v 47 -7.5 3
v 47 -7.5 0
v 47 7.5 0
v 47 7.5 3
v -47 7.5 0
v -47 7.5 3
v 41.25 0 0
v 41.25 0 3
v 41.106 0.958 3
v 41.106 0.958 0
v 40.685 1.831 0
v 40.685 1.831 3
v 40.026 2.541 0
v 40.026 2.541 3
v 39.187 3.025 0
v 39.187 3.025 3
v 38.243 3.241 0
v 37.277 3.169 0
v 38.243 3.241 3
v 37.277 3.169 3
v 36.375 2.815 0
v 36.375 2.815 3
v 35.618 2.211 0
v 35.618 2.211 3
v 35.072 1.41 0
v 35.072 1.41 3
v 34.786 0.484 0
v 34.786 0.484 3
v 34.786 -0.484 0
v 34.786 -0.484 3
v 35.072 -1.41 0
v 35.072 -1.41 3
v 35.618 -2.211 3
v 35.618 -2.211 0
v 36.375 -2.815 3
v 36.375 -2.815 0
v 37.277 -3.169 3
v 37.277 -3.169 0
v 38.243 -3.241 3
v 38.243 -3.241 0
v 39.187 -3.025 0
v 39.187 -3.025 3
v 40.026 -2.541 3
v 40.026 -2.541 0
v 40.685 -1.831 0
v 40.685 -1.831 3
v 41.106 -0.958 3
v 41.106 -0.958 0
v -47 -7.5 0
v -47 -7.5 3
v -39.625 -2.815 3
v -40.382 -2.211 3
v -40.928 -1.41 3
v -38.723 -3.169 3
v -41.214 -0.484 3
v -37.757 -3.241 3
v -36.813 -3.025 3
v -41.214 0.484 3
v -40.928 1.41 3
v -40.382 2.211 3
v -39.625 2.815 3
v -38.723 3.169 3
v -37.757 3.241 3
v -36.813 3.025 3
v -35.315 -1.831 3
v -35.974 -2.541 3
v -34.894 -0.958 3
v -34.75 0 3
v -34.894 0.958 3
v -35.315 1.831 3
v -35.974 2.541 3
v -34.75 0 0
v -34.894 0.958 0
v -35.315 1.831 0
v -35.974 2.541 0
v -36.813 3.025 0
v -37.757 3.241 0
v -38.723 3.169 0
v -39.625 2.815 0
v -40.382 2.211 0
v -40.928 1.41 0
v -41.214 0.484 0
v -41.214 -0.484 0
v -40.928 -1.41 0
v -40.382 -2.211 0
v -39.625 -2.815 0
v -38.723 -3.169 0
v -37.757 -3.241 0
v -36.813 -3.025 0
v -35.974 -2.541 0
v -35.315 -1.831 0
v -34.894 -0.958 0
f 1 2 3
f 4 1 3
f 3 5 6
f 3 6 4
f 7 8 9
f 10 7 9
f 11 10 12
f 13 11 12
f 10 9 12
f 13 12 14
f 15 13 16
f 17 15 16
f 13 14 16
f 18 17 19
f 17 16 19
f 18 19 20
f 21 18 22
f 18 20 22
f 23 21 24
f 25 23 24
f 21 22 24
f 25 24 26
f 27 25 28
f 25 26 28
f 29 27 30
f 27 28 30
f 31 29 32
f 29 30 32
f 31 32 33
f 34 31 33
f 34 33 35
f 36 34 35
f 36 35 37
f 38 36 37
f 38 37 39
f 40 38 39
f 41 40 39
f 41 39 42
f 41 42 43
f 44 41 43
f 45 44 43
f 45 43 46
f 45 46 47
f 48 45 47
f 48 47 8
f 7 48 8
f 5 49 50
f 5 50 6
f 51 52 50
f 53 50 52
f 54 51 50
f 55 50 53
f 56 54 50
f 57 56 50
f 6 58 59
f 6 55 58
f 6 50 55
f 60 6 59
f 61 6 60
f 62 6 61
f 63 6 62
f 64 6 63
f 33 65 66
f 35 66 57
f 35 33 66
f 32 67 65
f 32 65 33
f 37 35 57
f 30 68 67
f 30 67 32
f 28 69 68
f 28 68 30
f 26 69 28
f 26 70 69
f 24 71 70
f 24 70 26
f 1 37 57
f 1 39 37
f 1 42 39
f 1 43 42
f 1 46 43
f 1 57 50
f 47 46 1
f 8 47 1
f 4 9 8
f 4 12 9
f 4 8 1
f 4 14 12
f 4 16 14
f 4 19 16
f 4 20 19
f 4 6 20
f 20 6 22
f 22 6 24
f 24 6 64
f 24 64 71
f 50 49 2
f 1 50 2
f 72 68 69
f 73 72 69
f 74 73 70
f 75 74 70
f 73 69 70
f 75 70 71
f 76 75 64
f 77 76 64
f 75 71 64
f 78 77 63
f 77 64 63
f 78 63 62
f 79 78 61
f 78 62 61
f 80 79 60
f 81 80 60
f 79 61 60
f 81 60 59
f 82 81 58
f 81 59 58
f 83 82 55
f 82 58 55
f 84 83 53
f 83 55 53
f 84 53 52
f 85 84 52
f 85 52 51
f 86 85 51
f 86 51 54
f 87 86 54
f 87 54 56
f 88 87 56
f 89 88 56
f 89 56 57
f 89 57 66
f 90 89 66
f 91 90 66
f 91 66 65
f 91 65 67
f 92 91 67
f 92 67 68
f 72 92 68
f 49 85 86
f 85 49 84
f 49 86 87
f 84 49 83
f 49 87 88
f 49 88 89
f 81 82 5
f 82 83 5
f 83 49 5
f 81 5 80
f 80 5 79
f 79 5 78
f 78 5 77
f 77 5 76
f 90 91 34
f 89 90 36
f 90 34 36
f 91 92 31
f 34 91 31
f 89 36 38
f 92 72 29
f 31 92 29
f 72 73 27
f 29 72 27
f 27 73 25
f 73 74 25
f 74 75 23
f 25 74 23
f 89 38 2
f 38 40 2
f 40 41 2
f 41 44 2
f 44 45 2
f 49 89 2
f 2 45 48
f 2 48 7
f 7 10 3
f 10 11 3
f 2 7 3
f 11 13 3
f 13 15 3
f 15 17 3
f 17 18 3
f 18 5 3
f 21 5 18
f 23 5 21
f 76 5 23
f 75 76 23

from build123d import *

# Parameters (mm, degrees)
CROQUIS1_W              = 94
CROQUIS1_H              = 15
SALIENTE_EXTRUIR1_DEPTH = 3
CORTAR_EXTRUIR1_REACH   = 49.689
CROQUIS2_R              = 3.25


with BuildPart() as part:
    # Croquis1 → Saliente-Extruir1 (new body)
    with BuildSketch(Plane.XY):
        Rectangle(CROQUIS1_W, CROQUIS1_H)
    extrude(amount=SALIENTE_EXTRUIR1_DEPTH)

    # Croquis2 → Cortar-Extruir1 (cut, up to next)
    with BuildSketch(Plane.XY.offset(3), mode=Mode.PRIVATE) as cortar_extruir1_sk1:
        with Locations((-38, 0)):
            Circle(CROQUIS2_R)
    cortar_extruir1_tool1 = extrude(cortar_extruir1_sk1.sketch, amount=-CORTAR_EXTRUIR1_REACH, mode=Mode.PRIVATE) & part.part
    # Croquis2 → Cortar-Extruir1 (cut, up to next)
    with BuildSketch(Plane.XY.offset(3), mode=Mode.PRIVATE) as cortar_extruir1_sk2:
        with Locations((38, 0)):
            Circle(CROQUIS2_R)
    cortar_extruir1_tool2 = extrude(cortar_extruir1_sk2.sketch, amount=-CORTAR_EXTRUIR1_REACH, mode=Mode.PRIVATE) & part.part
    add(cortar_extruir1_tool1.solids().sort_by_distance((-38, 0, 3))[0], mode=Mode.SUBTRACT)
    add(cortar_extruir1_tool2.solids().sort_by_distance((38, 0, 3))[0], mode=Mode.SUBTRACT)


solid = part.part
